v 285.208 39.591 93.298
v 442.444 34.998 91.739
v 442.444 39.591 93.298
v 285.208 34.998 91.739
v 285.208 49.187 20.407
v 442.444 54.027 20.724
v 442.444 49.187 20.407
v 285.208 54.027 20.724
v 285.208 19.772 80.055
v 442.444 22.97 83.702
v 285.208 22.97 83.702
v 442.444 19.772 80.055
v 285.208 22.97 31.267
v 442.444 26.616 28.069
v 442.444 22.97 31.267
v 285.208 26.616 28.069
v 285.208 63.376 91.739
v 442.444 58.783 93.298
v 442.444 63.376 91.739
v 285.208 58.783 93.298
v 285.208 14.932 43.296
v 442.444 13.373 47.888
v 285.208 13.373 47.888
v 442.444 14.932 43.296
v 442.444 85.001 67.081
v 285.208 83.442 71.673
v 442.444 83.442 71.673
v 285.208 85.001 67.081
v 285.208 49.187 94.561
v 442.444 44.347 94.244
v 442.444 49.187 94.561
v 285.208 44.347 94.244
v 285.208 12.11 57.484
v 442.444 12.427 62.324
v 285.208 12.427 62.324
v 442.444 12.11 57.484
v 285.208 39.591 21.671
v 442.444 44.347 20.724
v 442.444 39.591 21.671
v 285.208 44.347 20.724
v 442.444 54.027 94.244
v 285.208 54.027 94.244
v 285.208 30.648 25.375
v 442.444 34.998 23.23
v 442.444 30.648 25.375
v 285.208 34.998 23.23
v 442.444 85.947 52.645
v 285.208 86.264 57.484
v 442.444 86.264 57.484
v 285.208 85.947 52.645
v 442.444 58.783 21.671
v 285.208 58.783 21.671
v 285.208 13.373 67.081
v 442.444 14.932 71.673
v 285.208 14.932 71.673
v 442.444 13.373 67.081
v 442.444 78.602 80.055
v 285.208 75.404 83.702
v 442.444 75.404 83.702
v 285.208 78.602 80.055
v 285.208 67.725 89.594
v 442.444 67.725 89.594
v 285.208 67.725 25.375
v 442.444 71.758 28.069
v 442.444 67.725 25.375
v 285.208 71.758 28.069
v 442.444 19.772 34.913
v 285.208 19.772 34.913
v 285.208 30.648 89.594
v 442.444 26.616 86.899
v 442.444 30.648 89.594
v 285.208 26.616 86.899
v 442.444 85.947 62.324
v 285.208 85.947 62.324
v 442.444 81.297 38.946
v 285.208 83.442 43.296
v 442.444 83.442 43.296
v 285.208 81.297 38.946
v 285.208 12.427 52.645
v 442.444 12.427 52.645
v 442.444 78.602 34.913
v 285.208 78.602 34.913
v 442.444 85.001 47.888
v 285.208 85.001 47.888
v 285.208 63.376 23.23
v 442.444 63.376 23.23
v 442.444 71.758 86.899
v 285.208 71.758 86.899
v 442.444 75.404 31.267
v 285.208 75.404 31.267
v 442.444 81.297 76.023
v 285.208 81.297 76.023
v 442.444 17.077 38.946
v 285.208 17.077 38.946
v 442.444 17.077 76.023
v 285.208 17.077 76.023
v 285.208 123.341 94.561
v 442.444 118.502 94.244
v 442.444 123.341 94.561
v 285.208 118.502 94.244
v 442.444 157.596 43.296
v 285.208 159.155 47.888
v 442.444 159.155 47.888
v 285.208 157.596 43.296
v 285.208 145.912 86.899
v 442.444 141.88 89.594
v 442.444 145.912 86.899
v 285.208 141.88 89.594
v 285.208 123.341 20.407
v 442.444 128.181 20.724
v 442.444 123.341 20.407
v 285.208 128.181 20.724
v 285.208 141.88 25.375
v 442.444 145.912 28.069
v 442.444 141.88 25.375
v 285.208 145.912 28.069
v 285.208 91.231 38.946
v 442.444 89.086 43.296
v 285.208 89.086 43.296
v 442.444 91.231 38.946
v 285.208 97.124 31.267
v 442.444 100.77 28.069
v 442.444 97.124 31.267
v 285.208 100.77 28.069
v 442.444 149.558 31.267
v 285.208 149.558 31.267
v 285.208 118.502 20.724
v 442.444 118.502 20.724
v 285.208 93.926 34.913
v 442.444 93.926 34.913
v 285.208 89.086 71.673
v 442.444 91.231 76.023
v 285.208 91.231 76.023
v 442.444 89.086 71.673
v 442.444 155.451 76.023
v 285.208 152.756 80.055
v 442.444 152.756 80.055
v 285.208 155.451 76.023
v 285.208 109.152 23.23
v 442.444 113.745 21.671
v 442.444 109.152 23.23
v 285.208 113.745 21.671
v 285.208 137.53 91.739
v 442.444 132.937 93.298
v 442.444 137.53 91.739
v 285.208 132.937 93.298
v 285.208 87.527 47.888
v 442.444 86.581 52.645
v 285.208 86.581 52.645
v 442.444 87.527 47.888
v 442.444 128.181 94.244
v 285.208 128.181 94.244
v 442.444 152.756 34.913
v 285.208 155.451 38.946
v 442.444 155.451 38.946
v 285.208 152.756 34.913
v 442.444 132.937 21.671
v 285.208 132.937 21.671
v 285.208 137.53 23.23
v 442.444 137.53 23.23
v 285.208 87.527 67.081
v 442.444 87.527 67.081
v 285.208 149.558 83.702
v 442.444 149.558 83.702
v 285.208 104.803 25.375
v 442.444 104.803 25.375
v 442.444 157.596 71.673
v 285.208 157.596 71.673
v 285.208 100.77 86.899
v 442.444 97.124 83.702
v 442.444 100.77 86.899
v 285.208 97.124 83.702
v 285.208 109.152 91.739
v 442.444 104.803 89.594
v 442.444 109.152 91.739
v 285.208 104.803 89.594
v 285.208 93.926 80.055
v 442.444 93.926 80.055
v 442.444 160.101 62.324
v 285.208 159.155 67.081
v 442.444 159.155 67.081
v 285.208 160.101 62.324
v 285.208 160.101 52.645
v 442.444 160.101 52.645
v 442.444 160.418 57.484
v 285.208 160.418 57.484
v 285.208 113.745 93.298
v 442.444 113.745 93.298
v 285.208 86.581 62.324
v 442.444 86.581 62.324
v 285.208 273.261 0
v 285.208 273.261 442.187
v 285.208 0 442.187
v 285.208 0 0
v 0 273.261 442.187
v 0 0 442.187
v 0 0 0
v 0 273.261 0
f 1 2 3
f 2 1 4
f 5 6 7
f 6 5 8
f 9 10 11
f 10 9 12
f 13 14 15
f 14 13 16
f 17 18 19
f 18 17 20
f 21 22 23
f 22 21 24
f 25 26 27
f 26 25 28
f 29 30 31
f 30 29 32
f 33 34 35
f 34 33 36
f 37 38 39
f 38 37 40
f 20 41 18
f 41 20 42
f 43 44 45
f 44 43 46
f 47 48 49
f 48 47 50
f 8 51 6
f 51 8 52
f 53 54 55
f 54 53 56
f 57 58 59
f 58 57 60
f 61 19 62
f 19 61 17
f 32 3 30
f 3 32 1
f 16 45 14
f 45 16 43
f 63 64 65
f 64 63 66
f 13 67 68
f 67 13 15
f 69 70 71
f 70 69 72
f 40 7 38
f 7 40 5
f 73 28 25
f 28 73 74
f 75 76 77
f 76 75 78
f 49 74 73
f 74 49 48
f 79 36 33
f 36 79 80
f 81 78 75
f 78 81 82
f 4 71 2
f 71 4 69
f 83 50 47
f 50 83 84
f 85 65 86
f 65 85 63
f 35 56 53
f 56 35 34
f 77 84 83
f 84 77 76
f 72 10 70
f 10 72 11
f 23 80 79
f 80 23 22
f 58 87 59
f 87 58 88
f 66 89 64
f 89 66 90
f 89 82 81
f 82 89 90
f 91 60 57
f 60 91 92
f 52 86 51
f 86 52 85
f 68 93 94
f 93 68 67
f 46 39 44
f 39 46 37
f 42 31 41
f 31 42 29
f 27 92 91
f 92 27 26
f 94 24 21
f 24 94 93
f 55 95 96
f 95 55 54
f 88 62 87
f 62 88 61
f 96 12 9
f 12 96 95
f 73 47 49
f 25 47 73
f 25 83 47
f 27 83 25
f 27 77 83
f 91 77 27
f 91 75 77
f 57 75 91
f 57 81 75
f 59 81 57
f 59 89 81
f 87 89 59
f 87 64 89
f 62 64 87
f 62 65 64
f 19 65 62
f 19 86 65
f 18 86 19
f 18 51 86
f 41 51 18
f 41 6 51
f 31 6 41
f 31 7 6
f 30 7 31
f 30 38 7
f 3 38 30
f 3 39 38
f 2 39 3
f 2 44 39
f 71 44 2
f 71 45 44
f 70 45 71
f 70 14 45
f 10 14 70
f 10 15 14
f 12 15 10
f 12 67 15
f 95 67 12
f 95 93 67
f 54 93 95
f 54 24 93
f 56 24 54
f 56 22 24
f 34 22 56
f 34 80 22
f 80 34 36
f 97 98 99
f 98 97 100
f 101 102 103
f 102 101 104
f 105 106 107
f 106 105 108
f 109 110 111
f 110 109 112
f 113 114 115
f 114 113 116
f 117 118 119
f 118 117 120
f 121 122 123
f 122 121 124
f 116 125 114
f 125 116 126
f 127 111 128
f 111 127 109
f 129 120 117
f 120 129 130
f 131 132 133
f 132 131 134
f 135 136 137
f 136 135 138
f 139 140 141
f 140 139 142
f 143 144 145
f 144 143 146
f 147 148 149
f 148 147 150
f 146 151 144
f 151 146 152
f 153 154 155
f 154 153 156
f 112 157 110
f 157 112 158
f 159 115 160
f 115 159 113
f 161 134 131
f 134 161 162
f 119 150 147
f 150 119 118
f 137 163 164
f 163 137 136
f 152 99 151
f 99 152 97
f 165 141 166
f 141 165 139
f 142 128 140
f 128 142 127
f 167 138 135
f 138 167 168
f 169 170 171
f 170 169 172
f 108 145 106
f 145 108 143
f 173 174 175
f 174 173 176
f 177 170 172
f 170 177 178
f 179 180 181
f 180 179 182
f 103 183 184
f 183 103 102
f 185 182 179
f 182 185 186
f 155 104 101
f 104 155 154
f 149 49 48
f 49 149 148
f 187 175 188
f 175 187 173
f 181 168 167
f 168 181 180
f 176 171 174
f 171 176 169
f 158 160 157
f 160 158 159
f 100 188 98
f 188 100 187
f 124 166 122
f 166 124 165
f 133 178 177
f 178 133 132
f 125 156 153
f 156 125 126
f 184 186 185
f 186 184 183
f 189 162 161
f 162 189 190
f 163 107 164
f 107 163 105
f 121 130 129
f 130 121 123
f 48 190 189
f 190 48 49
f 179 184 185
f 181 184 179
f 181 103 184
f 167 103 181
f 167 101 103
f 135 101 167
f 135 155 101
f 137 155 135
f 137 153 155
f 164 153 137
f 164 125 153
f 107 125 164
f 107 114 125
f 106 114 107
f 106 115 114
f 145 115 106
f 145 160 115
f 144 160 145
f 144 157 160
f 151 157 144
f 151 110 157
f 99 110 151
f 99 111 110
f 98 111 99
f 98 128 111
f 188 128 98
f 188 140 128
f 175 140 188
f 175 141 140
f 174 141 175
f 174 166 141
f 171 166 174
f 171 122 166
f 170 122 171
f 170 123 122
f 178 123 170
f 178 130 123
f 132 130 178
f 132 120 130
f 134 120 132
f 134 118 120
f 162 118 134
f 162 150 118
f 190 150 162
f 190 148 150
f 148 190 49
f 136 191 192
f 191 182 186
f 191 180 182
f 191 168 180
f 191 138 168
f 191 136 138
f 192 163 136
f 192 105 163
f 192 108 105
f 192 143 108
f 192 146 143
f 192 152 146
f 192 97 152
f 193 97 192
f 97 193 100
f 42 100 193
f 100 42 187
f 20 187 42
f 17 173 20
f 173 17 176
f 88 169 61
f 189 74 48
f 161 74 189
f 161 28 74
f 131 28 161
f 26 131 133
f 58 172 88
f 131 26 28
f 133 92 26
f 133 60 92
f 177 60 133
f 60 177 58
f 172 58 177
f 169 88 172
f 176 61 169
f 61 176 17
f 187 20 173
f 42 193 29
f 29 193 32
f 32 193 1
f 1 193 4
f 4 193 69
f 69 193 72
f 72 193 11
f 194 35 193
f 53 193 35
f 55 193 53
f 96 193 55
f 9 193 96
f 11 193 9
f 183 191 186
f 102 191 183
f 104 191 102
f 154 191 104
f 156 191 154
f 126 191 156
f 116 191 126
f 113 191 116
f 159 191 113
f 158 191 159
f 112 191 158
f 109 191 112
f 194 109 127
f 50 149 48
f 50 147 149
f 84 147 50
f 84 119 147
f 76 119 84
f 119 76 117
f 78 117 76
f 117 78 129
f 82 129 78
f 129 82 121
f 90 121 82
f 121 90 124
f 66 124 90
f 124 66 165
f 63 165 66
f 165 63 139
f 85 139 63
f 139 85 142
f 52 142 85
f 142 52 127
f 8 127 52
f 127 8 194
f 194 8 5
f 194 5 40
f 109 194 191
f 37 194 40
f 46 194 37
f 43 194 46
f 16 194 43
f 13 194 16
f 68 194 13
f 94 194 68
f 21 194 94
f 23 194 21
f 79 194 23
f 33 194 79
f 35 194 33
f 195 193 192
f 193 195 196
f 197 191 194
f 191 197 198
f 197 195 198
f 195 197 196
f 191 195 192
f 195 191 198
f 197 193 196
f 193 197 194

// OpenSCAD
// Simplified CAD reference from cleaned RealityScan mesh.
// Units: millimetres. This is a dimensional/keep-out reference only,
// not an enclosure and not production geometry.

$fn = 48;

// Cleaned mesh bounding box measured by scripts/clean_realityscan_mesh.py output.
mesh_min = [-160.609, 60.176, -266.145];
mesh_max = [124.599, 333.437, 176.042];
overall = [285.208, 273.261, 442.187];

// Origin normalized to cleaned mesh minimum corner for easier enclosure planning.
module overall_scan_envelope() {
  color([0.8, 0.8, 0.8, 0.18])
    translate([0, 0, 0]) cube(overall, center=false);
}

module cell_block() {
  // Six-cell block represented as tangent 18650 cells, scaled up to occupy the
  // major cell mass seen in the cleaned mesh. Verify exact cell pitch manually.
  cell_d = 18.4;
  cell_l = 65.2;
  pitch = cell_d;
  scale_to_scan = min(overall[0] * 0.78 / (3 * pitch), overall[2] * 0.70 / cell_l);
  sx = scale_to_scan;

  translate([overall[0] * 0.11, overall[1] * 0.18, overall[2] * 0.13])
    scale([sx, sx, sx])
      for (row = [0:1], col = [0:2])
        translate([col * pitch, row * pitch, 0])
          rotate([0, 90, 0])
            color([0.15, 0.15, 0.15, 0.55]) cylinder(d=cell_d, h=cell_l, center=false);
}

module pcb() {
  // Main PCB/reference plane. Captures electronics keep-out rather than component detail.
  color([0.0, 0.45, 0.12, 0.65])
    translate([overall[0] * 0.19, overall[1] * 0.70, overall[2] * 0.30])
      cube([overall[0] * 0.62, overall[1] * 0.035, overall[2] * 0.36], center=false);
}

module usb_c_charging_board() {
  color([0.05, 0.2, 0.75, 0.8])
    translate([overall[0] * 0.38, overall[1] * 0.75, overall[2] * 0.42])
      cube([overall[0] * 0.24, overall[1] * 0.055, overall[2] * 0.11], center=false);

  // USB-C port/opening marker on the outward face of the small board.
  color([0.02, 0.02, 0.02, 1.0])
    translate([overall[0] * 0.45, overall[1] * 0.807, overall[2] * 0.455])
      cube([overall[0] * 0.10, overall[1] * 0.018, overall[2] * 0.032], center=false);
}

module power_button() {
  color([0.9, 0.1, 0.1, 0.85])
    translate([overall[0] * 0.50, overall[1] * 0.825, overall[2] * 0.62])
      rotate([90, 0, 0]) cylinder(d=overall[0] * 0.075, h=overall[1] * 0.035, center=true);
}

module leds() {
  for (i = [0:3])
    color([1.0, 0.86, 0.1, 0.9])
      translate([overall[0] * (0.37 + i * 0.085), overall[1] * 0.828, overall[2] * 0.57])
        rotate([90, 0, 0]) cylinder(d=overall[0] * 0.030, h=overall[1] * 0.025, center=true);
}

module cad_reference_model() {
  overall_scan_envelope();
  cell_block();
  pcb();
  usb_c_charging_board();
  power_button();
  leds();
}

cad_reference_model();
